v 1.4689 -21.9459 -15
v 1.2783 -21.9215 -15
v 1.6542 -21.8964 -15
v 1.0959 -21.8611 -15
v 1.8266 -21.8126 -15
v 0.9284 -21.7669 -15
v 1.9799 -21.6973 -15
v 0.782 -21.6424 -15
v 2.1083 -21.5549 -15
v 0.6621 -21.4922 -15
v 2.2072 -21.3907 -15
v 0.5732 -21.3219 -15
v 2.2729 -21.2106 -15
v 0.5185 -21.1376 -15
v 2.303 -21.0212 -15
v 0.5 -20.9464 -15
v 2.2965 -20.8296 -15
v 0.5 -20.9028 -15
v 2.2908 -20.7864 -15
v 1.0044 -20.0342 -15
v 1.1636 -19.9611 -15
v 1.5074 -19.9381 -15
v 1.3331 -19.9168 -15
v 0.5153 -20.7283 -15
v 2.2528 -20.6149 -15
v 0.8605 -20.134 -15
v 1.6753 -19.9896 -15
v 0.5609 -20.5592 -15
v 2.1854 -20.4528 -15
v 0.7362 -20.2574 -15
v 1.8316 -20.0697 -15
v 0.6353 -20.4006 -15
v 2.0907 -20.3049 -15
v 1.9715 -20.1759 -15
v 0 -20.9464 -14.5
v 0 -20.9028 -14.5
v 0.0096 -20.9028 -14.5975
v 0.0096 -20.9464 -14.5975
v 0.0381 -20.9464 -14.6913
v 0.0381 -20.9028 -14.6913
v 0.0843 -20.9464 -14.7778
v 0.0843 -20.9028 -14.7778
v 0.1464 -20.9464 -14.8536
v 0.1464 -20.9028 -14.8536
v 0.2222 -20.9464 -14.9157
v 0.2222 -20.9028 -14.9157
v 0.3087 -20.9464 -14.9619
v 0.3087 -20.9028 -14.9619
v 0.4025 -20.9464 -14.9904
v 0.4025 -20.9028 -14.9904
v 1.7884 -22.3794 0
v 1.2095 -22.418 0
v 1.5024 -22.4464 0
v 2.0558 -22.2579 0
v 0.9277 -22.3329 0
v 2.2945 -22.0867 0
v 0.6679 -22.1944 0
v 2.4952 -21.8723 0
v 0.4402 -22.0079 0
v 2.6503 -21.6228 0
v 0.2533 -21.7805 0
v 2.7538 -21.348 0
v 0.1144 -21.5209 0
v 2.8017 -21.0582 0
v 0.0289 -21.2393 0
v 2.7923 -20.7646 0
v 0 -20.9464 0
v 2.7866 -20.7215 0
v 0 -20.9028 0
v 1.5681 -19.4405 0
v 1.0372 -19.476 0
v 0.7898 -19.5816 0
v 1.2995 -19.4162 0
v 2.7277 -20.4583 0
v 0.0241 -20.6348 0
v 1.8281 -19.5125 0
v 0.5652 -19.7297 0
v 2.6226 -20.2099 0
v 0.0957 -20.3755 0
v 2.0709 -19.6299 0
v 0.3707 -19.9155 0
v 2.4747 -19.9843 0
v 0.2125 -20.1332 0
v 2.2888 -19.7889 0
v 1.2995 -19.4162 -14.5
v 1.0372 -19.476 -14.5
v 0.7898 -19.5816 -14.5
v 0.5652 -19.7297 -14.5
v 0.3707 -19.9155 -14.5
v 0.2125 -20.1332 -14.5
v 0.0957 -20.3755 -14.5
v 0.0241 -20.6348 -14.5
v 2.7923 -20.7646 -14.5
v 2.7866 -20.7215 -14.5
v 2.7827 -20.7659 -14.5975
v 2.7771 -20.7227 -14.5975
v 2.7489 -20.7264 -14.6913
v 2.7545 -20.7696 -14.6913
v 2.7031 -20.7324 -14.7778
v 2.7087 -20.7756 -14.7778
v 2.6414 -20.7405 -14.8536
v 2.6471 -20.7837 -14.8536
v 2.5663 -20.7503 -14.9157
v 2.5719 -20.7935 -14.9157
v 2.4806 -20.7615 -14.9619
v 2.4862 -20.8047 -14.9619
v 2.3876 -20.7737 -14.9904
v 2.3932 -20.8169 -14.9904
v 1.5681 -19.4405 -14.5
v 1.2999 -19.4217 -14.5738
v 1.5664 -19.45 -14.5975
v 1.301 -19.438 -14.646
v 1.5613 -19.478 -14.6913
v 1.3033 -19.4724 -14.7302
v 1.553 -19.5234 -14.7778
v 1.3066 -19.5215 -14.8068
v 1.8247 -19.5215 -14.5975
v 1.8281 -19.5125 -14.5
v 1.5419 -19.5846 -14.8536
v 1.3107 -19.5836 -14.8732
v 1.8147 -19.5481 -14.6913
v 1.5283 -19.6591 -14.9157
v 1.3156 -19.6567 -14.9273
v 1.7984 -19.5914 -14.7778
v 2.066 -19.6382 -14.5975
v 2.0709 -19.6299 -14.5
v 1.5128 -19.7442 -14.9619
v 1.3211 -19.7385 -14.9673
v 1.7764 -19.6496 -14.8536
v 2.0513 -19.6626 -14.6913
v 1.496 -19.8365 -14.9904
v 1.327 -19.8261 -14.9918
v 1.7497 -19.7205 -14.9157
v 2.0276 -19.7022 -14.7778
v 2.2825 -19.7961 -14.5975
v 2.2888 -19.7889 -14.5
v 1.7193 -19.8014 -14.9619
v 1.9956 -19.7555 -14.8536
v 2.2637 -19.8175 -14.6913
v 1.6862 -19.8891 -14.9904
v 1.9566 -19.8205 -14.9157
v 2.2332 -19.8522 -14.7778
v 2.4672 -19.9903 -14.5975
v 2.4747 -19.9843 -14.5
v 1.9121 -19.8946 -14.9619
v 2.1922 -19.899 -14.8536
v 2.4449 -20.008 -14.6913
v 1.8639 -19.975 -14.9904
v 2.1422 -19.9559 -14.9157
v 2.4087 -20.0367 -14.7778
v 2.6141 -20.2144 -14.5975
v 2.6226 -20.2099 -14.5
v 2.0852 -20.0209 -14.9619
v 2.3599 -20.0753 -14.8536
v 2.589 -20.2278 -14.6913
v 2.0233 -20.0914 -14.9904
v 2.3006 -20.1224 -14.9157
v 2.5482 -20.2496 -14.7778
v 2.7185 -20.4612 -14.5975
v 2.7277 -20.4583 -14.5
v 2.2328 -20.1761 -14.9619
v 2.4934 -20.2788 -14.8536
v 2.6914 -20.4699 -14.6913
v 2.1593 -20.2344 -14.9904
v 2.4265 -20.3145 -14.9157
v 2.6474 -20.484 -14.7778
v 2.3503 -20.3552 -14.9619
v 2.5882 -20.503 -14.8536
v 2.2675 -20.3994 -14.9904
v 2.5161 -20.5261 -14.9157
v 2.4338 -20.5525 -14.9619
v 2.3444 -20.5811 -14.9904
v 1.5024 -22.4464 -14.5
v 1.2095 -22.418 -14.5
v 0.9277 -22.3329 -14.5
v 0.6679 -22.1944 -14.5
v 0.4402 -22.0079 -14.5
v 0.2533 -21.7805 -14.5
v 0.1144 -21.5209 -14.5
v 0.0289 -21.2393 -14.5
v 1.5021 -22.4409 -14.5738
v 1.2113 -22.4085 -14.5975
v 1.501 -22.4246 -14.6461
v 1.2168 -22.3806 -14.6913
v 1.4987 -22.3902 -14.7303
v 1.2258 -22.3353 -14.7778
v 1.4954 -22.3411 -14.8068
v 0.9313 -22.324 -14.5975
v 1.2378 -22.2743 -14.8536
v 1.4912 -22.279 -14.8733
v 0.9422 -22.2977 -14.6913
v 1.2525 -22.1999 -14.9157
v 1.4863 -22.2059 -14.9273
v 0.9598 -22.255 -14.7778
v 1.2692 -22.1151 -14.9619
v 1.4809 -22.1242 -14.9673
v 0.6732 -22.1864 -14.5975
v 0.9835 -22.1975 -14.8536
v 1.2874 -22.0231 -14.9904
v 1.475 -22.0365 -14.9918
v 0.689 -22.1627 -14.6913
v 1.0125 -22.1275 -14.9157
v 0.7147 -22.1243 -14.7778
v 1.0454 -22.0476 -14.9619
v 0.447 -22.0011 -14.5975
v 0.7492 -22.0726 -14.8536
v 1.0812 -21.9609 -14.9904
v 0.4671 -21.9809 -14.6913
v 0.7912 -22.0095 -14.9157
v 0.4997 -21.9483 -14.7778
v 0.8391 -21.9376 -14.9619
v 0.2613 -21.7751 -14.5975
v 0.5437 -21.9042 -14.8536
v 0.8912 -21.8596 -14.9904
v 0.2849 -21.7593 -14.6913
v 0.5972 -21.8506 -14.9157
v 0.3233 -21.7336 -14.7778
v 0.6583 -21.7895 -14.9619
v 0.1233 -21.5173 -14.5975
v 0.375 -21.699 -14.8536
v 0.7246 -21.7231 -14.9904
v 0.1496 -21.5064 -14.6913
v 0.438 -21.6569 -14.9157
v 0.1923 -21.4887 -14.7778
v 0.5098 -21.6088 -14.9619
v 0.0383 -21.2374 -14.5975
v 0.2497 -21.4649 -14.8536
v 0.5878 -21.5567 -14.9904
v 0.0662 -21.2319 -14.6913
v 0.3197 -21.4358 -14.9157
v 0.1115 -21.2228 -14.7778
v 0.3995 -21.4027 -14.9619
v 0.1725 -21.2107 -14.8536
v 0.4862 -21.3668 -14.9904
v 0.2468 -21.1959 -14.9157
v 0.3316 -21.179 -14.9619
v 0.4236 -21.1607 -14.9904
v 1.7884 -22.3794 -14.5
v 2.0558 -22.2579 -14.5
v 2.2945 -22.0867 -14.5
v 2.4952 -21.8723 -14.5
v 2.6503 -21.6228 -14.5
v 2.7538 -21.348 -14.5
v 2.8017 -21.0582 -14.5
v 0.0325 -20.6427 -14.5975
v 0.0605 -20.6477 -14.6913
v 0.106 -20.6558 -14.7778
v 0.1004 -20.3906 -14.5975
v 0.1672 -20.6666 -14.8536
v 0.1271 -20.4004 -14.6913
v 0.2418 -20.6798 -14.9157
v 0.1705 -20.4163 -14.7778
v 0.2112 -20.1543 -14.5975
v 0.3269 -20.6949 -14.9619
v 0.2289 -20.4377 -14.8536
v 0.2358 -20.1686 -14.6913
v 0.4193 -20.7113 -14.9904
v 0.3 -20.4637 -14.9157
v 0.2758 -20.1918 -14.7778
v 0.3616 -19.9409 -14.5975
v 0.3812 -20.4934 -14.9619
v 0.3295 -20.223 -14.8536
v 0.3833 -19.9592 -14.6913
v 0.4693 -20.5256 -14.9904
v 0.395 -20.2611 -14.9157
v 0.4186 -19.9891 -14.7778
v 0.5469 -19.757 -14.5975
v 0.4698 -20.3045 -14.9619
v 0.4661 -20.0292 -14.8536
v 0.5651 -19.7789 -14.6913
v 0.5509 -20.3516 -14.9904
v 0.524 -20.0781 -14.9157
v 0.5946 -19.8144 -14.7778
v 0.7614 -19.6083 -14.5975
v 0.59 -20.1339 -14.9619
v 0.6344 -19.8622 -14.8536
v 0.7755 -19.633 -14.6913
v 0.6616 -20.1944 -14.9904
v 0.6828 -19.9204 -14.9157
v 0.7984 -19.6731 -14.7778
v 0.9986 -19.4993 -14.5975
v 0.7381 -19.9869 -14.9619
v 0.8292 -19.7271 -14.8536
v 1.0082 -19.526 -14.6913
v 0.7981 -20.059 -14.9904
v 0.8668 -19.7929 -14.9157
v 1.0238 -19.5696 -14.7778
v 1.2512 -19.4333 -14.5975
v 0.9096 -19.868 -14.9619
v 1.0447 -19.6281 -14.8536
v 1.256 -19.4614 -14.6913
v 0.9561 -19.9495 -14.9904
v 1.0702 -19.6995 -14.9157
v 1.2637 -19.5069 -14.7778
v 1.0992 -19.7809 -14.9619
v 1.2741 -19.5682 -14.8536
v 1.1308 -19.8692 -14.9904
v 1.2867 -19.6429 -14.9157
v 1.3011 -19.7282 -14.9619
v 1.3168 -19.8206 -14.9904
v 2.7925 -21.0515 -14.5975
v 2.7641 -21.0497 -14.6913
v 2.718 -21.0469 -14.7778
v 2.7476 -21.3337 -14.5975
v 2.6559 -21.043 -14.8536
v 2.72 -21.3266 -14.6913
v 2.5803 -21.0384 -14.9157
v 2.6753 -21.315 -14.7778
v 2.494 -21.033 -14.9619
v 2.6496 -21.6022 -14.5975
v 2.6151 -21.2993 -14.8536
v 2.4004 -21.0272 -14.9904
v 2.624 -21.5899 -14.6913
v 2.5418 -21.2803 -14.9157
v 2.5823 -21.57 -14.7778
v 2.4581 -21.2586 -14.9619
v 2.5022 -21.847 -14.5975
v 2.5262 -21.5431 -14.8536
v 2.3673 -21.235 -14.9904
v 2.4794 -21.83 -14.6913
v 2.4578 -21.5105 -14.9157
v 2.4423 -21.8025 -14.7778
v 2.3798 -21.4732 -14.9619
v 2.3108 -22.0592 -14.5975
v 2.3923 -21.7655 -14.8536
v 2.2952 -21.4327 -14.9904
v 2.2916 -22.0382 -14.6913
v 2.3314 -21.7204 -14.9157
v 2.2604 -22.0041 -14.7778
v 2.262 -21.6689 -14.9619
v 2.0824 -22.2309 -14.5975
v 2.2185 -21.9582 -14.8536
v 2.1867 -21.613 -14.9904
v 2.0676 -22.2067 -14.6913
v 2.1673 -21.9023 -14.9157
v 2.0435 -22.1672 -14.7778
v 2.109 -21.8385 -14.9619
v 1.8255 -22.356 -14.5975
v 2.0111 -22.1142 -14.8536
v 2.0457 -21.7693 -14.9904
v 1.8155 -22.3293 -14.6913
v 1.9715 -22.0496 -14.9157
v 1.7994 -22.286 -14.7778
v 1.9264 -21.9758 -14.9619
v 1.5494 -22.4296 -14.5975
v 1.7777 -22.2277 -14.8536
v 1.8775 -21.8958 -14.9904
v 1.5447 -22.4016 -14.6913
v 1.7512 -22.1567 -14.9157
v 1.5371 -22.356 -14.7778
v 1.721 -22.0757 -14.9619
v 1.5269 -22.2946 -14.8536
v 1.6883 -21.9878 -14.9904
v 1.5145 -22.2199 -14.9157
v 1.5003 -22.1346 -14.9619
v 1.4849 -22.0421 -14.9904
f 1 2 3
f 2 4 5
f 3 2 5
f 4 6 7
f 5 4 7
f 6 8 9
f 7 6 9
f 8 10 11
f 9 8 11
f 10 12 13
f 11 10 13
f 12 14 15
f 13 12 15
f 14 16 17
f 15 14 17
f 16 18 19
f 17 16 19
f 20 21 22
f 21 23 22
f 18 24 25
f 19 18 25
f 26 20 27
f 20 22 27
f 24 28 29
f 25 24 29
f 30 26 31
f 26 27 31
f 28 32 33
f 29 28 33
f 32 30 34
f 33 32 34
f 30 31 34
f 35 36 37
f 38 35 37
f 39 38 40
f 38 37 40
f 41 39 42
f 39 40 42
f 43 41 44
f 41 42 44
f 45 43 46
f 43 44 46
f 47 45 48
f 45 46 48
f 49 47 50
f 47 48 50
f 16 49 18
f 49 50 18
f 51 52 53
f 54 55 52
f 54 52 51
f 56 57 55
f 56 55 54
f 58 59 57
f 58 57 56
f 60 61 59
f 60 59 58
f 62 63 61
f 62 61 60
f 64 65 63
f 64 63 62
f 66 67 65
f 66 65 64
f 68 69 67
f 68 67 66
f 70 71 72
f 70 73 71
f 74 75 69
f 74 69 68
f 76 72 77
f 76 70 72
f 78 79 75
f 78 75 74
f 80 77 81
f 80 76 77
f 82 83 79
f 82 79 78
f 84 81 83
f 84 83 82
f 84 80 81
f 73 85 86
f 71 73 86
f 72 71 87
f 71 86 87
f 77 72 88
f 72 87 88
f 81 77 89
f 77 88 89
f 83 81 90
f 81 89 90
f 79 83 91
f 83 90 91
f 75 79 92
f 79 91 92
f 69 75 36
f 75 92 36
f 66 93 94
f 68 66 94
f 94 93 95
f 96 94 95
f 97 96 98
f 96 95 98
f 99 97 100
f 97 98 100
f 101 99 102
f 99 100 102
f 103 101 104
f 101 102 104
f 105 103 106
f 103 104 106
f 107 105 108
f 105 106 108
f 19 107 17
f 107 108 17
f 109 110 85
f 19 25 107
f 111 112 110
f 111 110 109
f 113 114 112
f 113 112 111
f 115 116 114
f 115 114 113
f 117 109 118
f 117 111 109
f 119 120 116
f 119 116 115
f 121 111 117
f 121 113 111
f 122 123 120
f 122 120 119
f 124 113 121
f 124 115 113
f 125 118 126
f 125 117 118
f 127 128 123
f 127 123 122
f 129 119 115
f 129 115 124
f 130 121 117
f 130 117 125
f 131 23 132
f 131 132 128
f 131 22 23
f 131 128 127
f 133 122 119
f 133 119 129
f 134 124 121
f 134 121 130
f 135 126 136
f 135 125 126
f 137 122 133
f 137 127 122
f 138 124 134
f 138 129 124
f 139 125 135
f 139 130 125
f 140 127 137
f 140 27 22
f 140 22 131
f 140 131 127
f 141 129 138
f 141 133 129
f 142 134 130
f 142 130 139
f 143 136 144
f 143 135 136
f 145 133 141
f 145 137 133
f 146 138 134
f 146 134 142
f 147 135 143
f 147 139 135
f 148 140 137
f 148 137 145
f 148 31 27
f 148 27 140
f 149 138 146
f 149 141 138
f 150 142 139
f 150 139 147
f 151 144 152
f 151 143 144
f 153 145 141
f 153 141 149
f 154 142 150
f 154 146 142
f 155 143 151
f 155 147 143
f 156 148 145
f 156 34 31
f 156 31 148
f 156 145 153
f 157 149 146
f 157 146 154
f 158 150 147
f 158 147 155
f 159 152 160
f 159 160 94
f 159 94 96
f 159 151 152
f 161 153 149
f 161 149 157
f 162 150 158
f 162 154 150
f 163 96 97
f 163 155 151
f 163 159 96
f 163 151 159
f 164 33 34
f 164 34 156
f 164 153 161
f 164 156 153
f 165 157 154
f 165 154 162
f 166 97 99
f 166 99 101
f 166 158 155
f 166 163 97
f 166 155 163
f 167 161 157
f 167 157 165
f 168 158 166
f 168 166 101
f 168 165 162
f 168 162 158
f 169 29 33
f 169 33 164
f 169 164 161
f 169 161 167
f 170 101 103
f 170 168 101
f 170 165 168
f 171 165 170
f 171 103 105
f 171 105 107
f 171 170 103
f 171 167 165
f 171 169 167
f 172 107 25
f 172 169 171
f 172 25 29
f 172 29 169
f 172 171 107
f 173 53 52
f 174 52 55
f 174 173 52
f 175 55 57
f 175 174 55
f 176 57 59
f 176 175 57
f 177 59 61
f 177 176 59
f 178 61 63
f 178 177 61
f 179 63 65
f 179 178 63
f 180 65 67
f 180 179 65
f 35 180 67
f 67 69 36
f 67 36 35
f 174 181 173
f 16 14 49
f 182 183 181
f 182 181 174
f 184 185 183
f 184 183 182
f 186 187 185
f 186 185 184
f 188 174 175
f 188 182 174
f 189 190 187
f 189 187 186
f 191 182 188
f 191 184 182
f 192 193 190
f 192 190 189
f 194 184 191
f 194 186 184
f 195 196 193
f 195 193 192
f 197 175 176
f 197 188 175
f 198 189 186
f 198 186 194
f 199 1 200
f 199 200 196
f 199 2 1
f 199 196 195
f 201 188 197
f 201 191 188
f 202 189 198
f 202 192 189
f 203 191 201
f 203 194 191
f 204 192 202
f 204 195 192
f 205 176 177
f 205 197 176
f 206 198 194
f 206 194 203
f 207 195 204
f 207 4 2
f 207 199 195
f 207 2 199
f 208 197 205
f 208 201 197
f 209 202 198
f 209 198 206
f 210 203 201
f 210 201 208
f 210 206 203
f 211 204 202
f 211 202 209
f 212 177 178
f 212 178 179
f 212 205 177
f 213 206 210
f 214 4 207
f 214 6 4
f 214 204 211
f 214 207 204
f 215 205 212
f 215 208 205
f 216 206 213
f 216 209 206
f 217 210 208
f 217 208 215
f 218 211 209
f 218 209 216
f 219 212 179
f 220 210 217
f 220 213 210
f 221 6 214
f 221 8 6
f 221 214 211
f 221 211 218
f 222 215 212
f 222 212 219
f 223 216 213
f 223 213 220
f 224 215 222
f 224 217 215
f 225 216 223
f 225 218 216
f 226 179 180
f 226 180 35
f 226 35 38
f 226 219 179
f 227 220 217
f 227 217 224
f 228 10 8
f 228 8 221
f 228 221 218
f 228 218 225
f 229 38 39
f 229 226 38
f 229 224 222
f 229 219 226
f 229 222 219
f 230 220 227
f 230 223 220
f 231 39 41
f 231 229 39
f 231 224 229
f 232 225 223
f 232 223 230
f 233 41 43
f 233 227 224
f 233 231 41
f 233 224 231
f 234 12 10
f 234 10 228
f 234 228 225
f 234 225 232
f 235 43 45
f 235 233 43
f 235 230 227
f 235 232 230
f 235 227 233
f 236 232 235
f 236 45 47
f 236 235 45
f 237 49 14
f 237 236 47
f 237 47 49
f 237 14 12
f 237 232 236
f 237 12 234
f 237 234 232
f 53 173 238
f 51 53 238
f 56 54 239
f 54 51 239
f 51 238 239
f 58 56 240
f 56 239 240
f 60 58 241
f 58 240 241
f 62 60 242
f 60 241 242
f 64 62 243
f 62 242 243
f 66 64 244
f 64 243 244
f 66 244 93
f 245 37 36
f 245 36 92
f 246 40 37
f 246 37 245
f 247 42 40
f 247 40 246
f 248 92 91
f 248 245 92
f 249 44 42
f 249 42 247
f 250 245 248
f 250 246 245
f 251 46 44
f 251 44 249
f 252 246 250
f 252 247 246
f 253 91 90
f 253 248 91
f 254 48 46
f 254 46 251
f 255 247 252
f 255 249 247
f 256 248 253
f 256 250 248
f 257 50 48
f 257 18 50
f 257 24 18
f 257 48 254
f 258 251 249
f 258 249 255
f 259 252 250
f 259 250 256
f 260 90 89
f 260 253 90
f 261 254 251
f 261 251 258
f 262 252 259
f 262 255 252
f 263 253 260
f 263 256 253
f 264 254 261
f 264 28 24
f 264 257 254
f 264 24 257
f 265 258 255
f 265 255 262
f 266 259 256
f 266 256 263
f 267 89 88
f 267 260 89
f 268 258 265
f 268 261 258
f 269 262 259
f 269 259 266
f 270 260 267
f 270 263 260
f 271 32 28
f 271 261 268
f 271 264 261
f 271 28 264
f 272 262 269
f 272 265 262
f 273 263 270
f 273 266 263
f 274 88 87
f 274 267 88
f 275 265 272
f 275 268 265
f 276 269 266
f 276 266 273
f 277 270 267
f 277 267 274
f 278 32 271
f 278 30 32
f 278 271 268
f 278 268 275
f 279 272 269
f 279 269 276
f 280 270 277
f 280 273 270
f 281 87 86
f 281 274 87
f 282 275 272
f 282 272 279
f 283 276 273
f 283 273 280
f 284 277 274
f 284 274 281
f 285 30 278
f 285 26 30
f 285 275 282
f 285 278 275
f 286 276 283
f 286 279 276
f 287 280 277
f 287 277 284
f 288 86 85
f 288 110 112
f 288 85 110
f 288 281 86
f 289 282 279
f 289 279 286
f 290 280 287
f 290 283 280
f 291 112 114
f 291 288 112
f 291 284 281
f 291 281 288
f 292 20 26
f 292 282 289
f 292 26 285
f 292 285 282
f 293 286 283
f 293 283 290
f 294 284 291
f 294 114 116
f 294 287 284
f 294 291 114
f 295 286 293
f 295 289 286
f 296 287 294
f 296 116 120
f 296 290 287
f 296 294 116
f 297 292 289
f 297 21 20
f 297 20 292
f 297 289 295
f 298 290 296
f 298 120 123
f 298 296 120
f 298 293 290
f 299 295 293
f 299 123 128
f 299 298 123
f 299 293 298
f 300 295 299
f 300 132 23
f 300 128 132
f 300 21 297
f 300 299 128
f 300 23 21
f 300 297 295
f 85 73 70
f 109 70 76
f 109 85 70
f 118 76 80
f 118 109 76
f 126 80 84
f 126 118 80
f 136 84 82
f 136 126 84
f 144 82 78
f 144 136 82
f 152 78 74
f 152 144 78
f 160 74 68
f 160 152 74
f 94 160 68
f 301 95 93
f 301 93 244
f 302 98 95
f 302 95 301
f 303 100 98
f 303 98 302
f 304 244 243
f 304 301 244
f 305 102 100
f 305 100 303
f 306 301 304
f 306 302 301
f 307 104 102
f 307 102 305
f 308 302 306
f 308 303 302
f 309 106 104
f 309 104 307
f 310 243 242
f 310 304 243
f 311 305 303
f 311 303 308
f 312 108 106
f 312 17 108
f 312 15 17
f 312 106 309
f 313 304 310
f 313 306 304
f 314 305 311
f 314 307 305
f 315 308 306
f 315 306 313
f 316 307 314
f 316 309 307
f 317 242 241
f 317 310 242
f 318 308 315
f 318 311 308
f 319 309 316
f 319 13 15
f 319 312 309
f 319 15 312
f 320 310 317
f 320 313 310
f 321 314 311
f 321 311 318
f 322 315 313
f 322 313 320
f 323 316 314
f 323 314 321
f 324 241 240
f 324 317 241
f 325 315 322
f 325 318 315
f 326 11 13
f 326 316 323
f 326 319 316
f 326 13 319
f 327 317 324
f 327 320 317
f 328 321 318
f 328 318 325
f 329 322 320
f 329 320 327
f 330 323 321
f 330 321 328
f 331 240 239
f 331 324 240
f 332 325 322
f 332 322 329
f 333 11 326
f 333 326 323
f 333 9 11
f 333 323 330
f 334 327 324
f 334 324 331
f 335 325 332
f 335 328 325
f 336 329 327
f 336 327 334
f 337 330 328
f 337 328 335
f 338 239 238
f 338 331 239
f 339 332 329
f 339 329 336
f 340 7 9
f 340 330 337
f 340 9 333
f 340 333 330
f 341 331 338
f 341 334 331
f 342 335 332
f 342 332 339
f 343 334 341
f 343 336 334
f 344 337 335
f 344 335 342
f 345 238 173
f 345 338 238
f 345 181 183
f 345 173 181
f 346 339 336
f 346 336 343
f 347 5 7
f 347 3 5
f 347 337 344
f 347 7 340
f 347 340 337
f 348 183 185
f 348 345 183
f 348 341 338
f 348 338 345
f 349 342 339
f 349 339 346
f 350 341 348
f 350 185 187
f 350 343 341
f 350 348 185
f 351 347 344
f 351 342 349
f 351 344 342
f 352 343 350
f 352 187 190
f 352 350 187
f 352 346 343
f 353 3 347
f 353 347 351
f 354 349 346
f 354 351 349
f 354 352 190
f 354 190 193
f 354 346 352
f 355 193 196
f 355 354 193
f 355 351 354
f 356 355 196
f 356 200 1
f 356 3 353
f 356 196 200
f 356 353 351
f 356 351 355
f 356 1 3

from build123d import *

# Parameters (mm, degrees)
F1_DEPTH     = 15
F2_T1_DEPTH  = 23.0140868267
F2_T3_DEPTH  = 23.0408505773
F2_T5_DEPTH  = 22.0139169115
F2_T7_DEPTH  = 22.0399446
F3_T1_DEPTH  = 0.0435766834
F3_T3_DEPTH  = 0.0435423936
F3_T6_ANGLE  = 137.6611177832
F3_T8_ANGLE  = 137.8590578992
F3_T10_ANGLE = 130.081684858
F3_T12_ANGLE = 130.2935410412


# Not quite as in the source:
# - a fillet or chamfer that OpenCascade refuses, or shapes differently, is made with other operations: its cross-section is extruded or revolved along the edge and cut away or added


with BuildPart() as f1:
    # F0 (on Top) → F1 (new body)
    with BuildSketch(Plane.XY):
        with BuildLine():
            Line((0, -19.5), (0, -22.5))
            ThreePointArc((0, -22.5), (1.5, -22.4499443206), (2.9933259094, -22.3))
            Line((2.9933259094, -22.3), (2.9438857713, -21.9224737536))
            Line((2.9438857713, -21.9224737536), (2.6037776482, -19.3253988247))
            Line((2.6037776482, -19.3253988247), (0, -19.5))
        make_face()
    extrude(amount=-F1_DEPTH)

    # F2: fillet of radius 1.5 on 4 edges, made by hand

    # F2_s2 → F2_t1 (cut)
    with BuildSketch(Plane.XY.offset(-19.0070434133)):
        with BuildLine():
            ThreePointArc((1.3981688146, -22.4565162918), (2.4625908606, -21.9132942034), (2.792258148, -20.7646410751))
            Line((2.792258148, -20.7646410751), (2.9933259094, -22.3))
            ThreePointArc((2.9933259094, -22.3), (2.1971415101, -22.3924667954), (1.3981688146, -22.4565162918))
        make_face()
    extrude(amount=F2_T1_DEPTH, mode=Mode.SUBTRACT)

    # F2_s4 → F2_t3 (cut)
    with BuildSketch(Plane.XY.offset(-19.0204252887)):
        with BuildLine():
            ThreePointArc((1.6071428571, -22.4425286418), (0.4779222842, -22.0442476477), (0, -20.9463600657))
            Line((0, -20.9463600657), (0, -22.5))
            ThreePointArc((0, -22.5), (0.8040850577, -22.4856275701), (1.6071428571, -22.4425286418))
        make_face()
    extrude(amount=F2_T3_DEPTH, mode=Mode.SUBTRACT)

    # F2_s6 → F2_t5 (cut)
    with BuildSketch(Plane.XY.offset(-18.5069584558)):
        with BuildLine():
            ThreePointArc((1.3996400846, -19.4061445189), (0.4044316833, -19.8782200297), (0, -20.9027833823))
            Line((0, -20.9027833823), (0, -19.5))
            Line((0, -19.5), (1.3996400846, -19.4061445189))
        make_face()
    extrude(amount=F2_T5_DEPTH, mode=Mode.SUBTRACT)

    # F2_s8 → F2_t7 (cut)
    with BuildSketch(Plane.XY.offset(-18.5199723)):
        with BuildLine():
            ThreePointArc((1.1989436903, -19.4196025906), (2.2504156143, -19.7563337218), (2.7866041934, -20.7214673234))
            Line((2.7866041934, -20.7214673234), (2.6037776482, -19.3253988247))
            Line((2.6037776482, -19.3253988247), (1.1989436903, -19.4196025906))
        make_face()
    extrude(amount=F2_T7_DEPTH, mode=Mode.SUBTRACT)

    # F3: fillet of radius 0.5 on 6 edges, made by hand

    # F3_s2 → F3_t1 (cut)
    with BuildSketch(Plane.XZ.offset(20.9027833823)):
        with BuildLine():
            ThreePointArc((0, -14.5), (0.1464466094, -14.8535533906), (0.5, -15))
            Line((0.5, -15), (0, -15))
            Line((0, -15), (0, -14.5))
        make_face()
    extrude(amount=F3_T1_DEPTH, mode=Mode.SUBTRACT)

    # F3_s4 → F3_t3 (cut)
    with BuildSketch(Plane(origin=(2.7205290964, -20.7740345789, 0), x_dir=(0, 0, 1), z_dir=(-0.1298494204, 0.9915337251, 0))):
        with BuildLine():
            ThreePointArc((-14.5, 0.0723415147), (-14.8535533906, -0.0741050947), (-15, -0.4276584853))
            Line((-15, -0.4276584853), (-15, 0.0723415147))
            Line((-15, 0.0723415147), (-14.5, 0.0723415147))
        make_face()
    extrude(amount=F3_T3_DEPTH, mode=Mode.SUBTRACT)

    # F3_s5 → F3_t6 (revolve, cut)
    with BuildSketch(Plane(origin=(2.7205290981, -20.7740345786, 0), x_dir=(0, 0, 1), z_dir=(-0.1298494205, 0.9915337251, 0))):
        with BuildLine():
            ThreePointArc((-14.5, 0.072341513), (-14.8535533906, -0.0741050964), (-15, -0.427658487))
            Line((-15, -0.427658487), (-15, 0.072341513))
            Line((-15, 0.072341513), (-14.5, 0.072341513))
        make_face()
    revolve(axis=Axis((1.3049575605, -20.9594152058, -15), (0, 0, -1)), revolution_arc=F3_T6_ANGLE, mode=Mode.SUBTRACT)

    # F3_s7 → F3_t8 (revolve, cut)
    with BuildSketch(Plane(origin=(-9.7457924884, -10.7704005546, 0), x_dir=(0, 0, 1), z_dir=(0.6709566447, 0.7414965819, 0))):
        with BuildLine():
            ThreePointArc((-14.5, 16.6663443409), (-14.8535533906, 16.5198977315), (-15, 16.1663443409))
            Line((-15, 16.1663443409), (-15, 16.6663443409))
            Line((-15, 16.6663443409), (-14.5, 16.6663443409))
        make_face()
    revolve(axis=Axis((1.5000000001, -20.9463600656, -15), (0, 0, -1)), revolution_arc=F3_T8_ANGLE, mode=Mode.SUBTRACT)

    # F3_s9 → F3_t10 (revolve, cut)
    with BuildSketch(Plane.XZ.offset(20.9027833823)):
        with BuildLine():
            ThreePointArc((0, -14.5), (0.1464466094, -14.8535533906), (0.5, -15))
            Line((0.5, -15), (0, -15))
            Line((0, -15), (0, -14.5))
        make_face()
    revolve(axis=Axis((1.5, -20.9027833823, -15), (0, 0, -1)), revolution_arc=F3_T10_ANGLE, mode=Mode.SUBTRACT)

    # F3_s11 → F3_t12 (revolve, cut)
    with BuildSketch(Plane(origin=(-9.8225330213, -10.8154463672, 0), x_dir=(0, 0, 1), z_dir=(-0.672309547, -0.7402701352, 0))):
        with BuildLine():
            ThreePointArc((-14.5, -13.5240244723), (-14.8535533906, -13.6704710817), (-15, -14.0240244723))
            Line((-15, -14.0240244723), (-15, -13.5240244723))
            Line((-15, -13.5240244723), (-14.5, -13.5240244723))
        make_face()
    revolve(axis=Axis((1.2993036057, -20.916241454, -15), (0, 0, -1)), revolution_arc=F3_T12_ANGLE, mode=Mode.SUBTRACT)


solid = f1.part
